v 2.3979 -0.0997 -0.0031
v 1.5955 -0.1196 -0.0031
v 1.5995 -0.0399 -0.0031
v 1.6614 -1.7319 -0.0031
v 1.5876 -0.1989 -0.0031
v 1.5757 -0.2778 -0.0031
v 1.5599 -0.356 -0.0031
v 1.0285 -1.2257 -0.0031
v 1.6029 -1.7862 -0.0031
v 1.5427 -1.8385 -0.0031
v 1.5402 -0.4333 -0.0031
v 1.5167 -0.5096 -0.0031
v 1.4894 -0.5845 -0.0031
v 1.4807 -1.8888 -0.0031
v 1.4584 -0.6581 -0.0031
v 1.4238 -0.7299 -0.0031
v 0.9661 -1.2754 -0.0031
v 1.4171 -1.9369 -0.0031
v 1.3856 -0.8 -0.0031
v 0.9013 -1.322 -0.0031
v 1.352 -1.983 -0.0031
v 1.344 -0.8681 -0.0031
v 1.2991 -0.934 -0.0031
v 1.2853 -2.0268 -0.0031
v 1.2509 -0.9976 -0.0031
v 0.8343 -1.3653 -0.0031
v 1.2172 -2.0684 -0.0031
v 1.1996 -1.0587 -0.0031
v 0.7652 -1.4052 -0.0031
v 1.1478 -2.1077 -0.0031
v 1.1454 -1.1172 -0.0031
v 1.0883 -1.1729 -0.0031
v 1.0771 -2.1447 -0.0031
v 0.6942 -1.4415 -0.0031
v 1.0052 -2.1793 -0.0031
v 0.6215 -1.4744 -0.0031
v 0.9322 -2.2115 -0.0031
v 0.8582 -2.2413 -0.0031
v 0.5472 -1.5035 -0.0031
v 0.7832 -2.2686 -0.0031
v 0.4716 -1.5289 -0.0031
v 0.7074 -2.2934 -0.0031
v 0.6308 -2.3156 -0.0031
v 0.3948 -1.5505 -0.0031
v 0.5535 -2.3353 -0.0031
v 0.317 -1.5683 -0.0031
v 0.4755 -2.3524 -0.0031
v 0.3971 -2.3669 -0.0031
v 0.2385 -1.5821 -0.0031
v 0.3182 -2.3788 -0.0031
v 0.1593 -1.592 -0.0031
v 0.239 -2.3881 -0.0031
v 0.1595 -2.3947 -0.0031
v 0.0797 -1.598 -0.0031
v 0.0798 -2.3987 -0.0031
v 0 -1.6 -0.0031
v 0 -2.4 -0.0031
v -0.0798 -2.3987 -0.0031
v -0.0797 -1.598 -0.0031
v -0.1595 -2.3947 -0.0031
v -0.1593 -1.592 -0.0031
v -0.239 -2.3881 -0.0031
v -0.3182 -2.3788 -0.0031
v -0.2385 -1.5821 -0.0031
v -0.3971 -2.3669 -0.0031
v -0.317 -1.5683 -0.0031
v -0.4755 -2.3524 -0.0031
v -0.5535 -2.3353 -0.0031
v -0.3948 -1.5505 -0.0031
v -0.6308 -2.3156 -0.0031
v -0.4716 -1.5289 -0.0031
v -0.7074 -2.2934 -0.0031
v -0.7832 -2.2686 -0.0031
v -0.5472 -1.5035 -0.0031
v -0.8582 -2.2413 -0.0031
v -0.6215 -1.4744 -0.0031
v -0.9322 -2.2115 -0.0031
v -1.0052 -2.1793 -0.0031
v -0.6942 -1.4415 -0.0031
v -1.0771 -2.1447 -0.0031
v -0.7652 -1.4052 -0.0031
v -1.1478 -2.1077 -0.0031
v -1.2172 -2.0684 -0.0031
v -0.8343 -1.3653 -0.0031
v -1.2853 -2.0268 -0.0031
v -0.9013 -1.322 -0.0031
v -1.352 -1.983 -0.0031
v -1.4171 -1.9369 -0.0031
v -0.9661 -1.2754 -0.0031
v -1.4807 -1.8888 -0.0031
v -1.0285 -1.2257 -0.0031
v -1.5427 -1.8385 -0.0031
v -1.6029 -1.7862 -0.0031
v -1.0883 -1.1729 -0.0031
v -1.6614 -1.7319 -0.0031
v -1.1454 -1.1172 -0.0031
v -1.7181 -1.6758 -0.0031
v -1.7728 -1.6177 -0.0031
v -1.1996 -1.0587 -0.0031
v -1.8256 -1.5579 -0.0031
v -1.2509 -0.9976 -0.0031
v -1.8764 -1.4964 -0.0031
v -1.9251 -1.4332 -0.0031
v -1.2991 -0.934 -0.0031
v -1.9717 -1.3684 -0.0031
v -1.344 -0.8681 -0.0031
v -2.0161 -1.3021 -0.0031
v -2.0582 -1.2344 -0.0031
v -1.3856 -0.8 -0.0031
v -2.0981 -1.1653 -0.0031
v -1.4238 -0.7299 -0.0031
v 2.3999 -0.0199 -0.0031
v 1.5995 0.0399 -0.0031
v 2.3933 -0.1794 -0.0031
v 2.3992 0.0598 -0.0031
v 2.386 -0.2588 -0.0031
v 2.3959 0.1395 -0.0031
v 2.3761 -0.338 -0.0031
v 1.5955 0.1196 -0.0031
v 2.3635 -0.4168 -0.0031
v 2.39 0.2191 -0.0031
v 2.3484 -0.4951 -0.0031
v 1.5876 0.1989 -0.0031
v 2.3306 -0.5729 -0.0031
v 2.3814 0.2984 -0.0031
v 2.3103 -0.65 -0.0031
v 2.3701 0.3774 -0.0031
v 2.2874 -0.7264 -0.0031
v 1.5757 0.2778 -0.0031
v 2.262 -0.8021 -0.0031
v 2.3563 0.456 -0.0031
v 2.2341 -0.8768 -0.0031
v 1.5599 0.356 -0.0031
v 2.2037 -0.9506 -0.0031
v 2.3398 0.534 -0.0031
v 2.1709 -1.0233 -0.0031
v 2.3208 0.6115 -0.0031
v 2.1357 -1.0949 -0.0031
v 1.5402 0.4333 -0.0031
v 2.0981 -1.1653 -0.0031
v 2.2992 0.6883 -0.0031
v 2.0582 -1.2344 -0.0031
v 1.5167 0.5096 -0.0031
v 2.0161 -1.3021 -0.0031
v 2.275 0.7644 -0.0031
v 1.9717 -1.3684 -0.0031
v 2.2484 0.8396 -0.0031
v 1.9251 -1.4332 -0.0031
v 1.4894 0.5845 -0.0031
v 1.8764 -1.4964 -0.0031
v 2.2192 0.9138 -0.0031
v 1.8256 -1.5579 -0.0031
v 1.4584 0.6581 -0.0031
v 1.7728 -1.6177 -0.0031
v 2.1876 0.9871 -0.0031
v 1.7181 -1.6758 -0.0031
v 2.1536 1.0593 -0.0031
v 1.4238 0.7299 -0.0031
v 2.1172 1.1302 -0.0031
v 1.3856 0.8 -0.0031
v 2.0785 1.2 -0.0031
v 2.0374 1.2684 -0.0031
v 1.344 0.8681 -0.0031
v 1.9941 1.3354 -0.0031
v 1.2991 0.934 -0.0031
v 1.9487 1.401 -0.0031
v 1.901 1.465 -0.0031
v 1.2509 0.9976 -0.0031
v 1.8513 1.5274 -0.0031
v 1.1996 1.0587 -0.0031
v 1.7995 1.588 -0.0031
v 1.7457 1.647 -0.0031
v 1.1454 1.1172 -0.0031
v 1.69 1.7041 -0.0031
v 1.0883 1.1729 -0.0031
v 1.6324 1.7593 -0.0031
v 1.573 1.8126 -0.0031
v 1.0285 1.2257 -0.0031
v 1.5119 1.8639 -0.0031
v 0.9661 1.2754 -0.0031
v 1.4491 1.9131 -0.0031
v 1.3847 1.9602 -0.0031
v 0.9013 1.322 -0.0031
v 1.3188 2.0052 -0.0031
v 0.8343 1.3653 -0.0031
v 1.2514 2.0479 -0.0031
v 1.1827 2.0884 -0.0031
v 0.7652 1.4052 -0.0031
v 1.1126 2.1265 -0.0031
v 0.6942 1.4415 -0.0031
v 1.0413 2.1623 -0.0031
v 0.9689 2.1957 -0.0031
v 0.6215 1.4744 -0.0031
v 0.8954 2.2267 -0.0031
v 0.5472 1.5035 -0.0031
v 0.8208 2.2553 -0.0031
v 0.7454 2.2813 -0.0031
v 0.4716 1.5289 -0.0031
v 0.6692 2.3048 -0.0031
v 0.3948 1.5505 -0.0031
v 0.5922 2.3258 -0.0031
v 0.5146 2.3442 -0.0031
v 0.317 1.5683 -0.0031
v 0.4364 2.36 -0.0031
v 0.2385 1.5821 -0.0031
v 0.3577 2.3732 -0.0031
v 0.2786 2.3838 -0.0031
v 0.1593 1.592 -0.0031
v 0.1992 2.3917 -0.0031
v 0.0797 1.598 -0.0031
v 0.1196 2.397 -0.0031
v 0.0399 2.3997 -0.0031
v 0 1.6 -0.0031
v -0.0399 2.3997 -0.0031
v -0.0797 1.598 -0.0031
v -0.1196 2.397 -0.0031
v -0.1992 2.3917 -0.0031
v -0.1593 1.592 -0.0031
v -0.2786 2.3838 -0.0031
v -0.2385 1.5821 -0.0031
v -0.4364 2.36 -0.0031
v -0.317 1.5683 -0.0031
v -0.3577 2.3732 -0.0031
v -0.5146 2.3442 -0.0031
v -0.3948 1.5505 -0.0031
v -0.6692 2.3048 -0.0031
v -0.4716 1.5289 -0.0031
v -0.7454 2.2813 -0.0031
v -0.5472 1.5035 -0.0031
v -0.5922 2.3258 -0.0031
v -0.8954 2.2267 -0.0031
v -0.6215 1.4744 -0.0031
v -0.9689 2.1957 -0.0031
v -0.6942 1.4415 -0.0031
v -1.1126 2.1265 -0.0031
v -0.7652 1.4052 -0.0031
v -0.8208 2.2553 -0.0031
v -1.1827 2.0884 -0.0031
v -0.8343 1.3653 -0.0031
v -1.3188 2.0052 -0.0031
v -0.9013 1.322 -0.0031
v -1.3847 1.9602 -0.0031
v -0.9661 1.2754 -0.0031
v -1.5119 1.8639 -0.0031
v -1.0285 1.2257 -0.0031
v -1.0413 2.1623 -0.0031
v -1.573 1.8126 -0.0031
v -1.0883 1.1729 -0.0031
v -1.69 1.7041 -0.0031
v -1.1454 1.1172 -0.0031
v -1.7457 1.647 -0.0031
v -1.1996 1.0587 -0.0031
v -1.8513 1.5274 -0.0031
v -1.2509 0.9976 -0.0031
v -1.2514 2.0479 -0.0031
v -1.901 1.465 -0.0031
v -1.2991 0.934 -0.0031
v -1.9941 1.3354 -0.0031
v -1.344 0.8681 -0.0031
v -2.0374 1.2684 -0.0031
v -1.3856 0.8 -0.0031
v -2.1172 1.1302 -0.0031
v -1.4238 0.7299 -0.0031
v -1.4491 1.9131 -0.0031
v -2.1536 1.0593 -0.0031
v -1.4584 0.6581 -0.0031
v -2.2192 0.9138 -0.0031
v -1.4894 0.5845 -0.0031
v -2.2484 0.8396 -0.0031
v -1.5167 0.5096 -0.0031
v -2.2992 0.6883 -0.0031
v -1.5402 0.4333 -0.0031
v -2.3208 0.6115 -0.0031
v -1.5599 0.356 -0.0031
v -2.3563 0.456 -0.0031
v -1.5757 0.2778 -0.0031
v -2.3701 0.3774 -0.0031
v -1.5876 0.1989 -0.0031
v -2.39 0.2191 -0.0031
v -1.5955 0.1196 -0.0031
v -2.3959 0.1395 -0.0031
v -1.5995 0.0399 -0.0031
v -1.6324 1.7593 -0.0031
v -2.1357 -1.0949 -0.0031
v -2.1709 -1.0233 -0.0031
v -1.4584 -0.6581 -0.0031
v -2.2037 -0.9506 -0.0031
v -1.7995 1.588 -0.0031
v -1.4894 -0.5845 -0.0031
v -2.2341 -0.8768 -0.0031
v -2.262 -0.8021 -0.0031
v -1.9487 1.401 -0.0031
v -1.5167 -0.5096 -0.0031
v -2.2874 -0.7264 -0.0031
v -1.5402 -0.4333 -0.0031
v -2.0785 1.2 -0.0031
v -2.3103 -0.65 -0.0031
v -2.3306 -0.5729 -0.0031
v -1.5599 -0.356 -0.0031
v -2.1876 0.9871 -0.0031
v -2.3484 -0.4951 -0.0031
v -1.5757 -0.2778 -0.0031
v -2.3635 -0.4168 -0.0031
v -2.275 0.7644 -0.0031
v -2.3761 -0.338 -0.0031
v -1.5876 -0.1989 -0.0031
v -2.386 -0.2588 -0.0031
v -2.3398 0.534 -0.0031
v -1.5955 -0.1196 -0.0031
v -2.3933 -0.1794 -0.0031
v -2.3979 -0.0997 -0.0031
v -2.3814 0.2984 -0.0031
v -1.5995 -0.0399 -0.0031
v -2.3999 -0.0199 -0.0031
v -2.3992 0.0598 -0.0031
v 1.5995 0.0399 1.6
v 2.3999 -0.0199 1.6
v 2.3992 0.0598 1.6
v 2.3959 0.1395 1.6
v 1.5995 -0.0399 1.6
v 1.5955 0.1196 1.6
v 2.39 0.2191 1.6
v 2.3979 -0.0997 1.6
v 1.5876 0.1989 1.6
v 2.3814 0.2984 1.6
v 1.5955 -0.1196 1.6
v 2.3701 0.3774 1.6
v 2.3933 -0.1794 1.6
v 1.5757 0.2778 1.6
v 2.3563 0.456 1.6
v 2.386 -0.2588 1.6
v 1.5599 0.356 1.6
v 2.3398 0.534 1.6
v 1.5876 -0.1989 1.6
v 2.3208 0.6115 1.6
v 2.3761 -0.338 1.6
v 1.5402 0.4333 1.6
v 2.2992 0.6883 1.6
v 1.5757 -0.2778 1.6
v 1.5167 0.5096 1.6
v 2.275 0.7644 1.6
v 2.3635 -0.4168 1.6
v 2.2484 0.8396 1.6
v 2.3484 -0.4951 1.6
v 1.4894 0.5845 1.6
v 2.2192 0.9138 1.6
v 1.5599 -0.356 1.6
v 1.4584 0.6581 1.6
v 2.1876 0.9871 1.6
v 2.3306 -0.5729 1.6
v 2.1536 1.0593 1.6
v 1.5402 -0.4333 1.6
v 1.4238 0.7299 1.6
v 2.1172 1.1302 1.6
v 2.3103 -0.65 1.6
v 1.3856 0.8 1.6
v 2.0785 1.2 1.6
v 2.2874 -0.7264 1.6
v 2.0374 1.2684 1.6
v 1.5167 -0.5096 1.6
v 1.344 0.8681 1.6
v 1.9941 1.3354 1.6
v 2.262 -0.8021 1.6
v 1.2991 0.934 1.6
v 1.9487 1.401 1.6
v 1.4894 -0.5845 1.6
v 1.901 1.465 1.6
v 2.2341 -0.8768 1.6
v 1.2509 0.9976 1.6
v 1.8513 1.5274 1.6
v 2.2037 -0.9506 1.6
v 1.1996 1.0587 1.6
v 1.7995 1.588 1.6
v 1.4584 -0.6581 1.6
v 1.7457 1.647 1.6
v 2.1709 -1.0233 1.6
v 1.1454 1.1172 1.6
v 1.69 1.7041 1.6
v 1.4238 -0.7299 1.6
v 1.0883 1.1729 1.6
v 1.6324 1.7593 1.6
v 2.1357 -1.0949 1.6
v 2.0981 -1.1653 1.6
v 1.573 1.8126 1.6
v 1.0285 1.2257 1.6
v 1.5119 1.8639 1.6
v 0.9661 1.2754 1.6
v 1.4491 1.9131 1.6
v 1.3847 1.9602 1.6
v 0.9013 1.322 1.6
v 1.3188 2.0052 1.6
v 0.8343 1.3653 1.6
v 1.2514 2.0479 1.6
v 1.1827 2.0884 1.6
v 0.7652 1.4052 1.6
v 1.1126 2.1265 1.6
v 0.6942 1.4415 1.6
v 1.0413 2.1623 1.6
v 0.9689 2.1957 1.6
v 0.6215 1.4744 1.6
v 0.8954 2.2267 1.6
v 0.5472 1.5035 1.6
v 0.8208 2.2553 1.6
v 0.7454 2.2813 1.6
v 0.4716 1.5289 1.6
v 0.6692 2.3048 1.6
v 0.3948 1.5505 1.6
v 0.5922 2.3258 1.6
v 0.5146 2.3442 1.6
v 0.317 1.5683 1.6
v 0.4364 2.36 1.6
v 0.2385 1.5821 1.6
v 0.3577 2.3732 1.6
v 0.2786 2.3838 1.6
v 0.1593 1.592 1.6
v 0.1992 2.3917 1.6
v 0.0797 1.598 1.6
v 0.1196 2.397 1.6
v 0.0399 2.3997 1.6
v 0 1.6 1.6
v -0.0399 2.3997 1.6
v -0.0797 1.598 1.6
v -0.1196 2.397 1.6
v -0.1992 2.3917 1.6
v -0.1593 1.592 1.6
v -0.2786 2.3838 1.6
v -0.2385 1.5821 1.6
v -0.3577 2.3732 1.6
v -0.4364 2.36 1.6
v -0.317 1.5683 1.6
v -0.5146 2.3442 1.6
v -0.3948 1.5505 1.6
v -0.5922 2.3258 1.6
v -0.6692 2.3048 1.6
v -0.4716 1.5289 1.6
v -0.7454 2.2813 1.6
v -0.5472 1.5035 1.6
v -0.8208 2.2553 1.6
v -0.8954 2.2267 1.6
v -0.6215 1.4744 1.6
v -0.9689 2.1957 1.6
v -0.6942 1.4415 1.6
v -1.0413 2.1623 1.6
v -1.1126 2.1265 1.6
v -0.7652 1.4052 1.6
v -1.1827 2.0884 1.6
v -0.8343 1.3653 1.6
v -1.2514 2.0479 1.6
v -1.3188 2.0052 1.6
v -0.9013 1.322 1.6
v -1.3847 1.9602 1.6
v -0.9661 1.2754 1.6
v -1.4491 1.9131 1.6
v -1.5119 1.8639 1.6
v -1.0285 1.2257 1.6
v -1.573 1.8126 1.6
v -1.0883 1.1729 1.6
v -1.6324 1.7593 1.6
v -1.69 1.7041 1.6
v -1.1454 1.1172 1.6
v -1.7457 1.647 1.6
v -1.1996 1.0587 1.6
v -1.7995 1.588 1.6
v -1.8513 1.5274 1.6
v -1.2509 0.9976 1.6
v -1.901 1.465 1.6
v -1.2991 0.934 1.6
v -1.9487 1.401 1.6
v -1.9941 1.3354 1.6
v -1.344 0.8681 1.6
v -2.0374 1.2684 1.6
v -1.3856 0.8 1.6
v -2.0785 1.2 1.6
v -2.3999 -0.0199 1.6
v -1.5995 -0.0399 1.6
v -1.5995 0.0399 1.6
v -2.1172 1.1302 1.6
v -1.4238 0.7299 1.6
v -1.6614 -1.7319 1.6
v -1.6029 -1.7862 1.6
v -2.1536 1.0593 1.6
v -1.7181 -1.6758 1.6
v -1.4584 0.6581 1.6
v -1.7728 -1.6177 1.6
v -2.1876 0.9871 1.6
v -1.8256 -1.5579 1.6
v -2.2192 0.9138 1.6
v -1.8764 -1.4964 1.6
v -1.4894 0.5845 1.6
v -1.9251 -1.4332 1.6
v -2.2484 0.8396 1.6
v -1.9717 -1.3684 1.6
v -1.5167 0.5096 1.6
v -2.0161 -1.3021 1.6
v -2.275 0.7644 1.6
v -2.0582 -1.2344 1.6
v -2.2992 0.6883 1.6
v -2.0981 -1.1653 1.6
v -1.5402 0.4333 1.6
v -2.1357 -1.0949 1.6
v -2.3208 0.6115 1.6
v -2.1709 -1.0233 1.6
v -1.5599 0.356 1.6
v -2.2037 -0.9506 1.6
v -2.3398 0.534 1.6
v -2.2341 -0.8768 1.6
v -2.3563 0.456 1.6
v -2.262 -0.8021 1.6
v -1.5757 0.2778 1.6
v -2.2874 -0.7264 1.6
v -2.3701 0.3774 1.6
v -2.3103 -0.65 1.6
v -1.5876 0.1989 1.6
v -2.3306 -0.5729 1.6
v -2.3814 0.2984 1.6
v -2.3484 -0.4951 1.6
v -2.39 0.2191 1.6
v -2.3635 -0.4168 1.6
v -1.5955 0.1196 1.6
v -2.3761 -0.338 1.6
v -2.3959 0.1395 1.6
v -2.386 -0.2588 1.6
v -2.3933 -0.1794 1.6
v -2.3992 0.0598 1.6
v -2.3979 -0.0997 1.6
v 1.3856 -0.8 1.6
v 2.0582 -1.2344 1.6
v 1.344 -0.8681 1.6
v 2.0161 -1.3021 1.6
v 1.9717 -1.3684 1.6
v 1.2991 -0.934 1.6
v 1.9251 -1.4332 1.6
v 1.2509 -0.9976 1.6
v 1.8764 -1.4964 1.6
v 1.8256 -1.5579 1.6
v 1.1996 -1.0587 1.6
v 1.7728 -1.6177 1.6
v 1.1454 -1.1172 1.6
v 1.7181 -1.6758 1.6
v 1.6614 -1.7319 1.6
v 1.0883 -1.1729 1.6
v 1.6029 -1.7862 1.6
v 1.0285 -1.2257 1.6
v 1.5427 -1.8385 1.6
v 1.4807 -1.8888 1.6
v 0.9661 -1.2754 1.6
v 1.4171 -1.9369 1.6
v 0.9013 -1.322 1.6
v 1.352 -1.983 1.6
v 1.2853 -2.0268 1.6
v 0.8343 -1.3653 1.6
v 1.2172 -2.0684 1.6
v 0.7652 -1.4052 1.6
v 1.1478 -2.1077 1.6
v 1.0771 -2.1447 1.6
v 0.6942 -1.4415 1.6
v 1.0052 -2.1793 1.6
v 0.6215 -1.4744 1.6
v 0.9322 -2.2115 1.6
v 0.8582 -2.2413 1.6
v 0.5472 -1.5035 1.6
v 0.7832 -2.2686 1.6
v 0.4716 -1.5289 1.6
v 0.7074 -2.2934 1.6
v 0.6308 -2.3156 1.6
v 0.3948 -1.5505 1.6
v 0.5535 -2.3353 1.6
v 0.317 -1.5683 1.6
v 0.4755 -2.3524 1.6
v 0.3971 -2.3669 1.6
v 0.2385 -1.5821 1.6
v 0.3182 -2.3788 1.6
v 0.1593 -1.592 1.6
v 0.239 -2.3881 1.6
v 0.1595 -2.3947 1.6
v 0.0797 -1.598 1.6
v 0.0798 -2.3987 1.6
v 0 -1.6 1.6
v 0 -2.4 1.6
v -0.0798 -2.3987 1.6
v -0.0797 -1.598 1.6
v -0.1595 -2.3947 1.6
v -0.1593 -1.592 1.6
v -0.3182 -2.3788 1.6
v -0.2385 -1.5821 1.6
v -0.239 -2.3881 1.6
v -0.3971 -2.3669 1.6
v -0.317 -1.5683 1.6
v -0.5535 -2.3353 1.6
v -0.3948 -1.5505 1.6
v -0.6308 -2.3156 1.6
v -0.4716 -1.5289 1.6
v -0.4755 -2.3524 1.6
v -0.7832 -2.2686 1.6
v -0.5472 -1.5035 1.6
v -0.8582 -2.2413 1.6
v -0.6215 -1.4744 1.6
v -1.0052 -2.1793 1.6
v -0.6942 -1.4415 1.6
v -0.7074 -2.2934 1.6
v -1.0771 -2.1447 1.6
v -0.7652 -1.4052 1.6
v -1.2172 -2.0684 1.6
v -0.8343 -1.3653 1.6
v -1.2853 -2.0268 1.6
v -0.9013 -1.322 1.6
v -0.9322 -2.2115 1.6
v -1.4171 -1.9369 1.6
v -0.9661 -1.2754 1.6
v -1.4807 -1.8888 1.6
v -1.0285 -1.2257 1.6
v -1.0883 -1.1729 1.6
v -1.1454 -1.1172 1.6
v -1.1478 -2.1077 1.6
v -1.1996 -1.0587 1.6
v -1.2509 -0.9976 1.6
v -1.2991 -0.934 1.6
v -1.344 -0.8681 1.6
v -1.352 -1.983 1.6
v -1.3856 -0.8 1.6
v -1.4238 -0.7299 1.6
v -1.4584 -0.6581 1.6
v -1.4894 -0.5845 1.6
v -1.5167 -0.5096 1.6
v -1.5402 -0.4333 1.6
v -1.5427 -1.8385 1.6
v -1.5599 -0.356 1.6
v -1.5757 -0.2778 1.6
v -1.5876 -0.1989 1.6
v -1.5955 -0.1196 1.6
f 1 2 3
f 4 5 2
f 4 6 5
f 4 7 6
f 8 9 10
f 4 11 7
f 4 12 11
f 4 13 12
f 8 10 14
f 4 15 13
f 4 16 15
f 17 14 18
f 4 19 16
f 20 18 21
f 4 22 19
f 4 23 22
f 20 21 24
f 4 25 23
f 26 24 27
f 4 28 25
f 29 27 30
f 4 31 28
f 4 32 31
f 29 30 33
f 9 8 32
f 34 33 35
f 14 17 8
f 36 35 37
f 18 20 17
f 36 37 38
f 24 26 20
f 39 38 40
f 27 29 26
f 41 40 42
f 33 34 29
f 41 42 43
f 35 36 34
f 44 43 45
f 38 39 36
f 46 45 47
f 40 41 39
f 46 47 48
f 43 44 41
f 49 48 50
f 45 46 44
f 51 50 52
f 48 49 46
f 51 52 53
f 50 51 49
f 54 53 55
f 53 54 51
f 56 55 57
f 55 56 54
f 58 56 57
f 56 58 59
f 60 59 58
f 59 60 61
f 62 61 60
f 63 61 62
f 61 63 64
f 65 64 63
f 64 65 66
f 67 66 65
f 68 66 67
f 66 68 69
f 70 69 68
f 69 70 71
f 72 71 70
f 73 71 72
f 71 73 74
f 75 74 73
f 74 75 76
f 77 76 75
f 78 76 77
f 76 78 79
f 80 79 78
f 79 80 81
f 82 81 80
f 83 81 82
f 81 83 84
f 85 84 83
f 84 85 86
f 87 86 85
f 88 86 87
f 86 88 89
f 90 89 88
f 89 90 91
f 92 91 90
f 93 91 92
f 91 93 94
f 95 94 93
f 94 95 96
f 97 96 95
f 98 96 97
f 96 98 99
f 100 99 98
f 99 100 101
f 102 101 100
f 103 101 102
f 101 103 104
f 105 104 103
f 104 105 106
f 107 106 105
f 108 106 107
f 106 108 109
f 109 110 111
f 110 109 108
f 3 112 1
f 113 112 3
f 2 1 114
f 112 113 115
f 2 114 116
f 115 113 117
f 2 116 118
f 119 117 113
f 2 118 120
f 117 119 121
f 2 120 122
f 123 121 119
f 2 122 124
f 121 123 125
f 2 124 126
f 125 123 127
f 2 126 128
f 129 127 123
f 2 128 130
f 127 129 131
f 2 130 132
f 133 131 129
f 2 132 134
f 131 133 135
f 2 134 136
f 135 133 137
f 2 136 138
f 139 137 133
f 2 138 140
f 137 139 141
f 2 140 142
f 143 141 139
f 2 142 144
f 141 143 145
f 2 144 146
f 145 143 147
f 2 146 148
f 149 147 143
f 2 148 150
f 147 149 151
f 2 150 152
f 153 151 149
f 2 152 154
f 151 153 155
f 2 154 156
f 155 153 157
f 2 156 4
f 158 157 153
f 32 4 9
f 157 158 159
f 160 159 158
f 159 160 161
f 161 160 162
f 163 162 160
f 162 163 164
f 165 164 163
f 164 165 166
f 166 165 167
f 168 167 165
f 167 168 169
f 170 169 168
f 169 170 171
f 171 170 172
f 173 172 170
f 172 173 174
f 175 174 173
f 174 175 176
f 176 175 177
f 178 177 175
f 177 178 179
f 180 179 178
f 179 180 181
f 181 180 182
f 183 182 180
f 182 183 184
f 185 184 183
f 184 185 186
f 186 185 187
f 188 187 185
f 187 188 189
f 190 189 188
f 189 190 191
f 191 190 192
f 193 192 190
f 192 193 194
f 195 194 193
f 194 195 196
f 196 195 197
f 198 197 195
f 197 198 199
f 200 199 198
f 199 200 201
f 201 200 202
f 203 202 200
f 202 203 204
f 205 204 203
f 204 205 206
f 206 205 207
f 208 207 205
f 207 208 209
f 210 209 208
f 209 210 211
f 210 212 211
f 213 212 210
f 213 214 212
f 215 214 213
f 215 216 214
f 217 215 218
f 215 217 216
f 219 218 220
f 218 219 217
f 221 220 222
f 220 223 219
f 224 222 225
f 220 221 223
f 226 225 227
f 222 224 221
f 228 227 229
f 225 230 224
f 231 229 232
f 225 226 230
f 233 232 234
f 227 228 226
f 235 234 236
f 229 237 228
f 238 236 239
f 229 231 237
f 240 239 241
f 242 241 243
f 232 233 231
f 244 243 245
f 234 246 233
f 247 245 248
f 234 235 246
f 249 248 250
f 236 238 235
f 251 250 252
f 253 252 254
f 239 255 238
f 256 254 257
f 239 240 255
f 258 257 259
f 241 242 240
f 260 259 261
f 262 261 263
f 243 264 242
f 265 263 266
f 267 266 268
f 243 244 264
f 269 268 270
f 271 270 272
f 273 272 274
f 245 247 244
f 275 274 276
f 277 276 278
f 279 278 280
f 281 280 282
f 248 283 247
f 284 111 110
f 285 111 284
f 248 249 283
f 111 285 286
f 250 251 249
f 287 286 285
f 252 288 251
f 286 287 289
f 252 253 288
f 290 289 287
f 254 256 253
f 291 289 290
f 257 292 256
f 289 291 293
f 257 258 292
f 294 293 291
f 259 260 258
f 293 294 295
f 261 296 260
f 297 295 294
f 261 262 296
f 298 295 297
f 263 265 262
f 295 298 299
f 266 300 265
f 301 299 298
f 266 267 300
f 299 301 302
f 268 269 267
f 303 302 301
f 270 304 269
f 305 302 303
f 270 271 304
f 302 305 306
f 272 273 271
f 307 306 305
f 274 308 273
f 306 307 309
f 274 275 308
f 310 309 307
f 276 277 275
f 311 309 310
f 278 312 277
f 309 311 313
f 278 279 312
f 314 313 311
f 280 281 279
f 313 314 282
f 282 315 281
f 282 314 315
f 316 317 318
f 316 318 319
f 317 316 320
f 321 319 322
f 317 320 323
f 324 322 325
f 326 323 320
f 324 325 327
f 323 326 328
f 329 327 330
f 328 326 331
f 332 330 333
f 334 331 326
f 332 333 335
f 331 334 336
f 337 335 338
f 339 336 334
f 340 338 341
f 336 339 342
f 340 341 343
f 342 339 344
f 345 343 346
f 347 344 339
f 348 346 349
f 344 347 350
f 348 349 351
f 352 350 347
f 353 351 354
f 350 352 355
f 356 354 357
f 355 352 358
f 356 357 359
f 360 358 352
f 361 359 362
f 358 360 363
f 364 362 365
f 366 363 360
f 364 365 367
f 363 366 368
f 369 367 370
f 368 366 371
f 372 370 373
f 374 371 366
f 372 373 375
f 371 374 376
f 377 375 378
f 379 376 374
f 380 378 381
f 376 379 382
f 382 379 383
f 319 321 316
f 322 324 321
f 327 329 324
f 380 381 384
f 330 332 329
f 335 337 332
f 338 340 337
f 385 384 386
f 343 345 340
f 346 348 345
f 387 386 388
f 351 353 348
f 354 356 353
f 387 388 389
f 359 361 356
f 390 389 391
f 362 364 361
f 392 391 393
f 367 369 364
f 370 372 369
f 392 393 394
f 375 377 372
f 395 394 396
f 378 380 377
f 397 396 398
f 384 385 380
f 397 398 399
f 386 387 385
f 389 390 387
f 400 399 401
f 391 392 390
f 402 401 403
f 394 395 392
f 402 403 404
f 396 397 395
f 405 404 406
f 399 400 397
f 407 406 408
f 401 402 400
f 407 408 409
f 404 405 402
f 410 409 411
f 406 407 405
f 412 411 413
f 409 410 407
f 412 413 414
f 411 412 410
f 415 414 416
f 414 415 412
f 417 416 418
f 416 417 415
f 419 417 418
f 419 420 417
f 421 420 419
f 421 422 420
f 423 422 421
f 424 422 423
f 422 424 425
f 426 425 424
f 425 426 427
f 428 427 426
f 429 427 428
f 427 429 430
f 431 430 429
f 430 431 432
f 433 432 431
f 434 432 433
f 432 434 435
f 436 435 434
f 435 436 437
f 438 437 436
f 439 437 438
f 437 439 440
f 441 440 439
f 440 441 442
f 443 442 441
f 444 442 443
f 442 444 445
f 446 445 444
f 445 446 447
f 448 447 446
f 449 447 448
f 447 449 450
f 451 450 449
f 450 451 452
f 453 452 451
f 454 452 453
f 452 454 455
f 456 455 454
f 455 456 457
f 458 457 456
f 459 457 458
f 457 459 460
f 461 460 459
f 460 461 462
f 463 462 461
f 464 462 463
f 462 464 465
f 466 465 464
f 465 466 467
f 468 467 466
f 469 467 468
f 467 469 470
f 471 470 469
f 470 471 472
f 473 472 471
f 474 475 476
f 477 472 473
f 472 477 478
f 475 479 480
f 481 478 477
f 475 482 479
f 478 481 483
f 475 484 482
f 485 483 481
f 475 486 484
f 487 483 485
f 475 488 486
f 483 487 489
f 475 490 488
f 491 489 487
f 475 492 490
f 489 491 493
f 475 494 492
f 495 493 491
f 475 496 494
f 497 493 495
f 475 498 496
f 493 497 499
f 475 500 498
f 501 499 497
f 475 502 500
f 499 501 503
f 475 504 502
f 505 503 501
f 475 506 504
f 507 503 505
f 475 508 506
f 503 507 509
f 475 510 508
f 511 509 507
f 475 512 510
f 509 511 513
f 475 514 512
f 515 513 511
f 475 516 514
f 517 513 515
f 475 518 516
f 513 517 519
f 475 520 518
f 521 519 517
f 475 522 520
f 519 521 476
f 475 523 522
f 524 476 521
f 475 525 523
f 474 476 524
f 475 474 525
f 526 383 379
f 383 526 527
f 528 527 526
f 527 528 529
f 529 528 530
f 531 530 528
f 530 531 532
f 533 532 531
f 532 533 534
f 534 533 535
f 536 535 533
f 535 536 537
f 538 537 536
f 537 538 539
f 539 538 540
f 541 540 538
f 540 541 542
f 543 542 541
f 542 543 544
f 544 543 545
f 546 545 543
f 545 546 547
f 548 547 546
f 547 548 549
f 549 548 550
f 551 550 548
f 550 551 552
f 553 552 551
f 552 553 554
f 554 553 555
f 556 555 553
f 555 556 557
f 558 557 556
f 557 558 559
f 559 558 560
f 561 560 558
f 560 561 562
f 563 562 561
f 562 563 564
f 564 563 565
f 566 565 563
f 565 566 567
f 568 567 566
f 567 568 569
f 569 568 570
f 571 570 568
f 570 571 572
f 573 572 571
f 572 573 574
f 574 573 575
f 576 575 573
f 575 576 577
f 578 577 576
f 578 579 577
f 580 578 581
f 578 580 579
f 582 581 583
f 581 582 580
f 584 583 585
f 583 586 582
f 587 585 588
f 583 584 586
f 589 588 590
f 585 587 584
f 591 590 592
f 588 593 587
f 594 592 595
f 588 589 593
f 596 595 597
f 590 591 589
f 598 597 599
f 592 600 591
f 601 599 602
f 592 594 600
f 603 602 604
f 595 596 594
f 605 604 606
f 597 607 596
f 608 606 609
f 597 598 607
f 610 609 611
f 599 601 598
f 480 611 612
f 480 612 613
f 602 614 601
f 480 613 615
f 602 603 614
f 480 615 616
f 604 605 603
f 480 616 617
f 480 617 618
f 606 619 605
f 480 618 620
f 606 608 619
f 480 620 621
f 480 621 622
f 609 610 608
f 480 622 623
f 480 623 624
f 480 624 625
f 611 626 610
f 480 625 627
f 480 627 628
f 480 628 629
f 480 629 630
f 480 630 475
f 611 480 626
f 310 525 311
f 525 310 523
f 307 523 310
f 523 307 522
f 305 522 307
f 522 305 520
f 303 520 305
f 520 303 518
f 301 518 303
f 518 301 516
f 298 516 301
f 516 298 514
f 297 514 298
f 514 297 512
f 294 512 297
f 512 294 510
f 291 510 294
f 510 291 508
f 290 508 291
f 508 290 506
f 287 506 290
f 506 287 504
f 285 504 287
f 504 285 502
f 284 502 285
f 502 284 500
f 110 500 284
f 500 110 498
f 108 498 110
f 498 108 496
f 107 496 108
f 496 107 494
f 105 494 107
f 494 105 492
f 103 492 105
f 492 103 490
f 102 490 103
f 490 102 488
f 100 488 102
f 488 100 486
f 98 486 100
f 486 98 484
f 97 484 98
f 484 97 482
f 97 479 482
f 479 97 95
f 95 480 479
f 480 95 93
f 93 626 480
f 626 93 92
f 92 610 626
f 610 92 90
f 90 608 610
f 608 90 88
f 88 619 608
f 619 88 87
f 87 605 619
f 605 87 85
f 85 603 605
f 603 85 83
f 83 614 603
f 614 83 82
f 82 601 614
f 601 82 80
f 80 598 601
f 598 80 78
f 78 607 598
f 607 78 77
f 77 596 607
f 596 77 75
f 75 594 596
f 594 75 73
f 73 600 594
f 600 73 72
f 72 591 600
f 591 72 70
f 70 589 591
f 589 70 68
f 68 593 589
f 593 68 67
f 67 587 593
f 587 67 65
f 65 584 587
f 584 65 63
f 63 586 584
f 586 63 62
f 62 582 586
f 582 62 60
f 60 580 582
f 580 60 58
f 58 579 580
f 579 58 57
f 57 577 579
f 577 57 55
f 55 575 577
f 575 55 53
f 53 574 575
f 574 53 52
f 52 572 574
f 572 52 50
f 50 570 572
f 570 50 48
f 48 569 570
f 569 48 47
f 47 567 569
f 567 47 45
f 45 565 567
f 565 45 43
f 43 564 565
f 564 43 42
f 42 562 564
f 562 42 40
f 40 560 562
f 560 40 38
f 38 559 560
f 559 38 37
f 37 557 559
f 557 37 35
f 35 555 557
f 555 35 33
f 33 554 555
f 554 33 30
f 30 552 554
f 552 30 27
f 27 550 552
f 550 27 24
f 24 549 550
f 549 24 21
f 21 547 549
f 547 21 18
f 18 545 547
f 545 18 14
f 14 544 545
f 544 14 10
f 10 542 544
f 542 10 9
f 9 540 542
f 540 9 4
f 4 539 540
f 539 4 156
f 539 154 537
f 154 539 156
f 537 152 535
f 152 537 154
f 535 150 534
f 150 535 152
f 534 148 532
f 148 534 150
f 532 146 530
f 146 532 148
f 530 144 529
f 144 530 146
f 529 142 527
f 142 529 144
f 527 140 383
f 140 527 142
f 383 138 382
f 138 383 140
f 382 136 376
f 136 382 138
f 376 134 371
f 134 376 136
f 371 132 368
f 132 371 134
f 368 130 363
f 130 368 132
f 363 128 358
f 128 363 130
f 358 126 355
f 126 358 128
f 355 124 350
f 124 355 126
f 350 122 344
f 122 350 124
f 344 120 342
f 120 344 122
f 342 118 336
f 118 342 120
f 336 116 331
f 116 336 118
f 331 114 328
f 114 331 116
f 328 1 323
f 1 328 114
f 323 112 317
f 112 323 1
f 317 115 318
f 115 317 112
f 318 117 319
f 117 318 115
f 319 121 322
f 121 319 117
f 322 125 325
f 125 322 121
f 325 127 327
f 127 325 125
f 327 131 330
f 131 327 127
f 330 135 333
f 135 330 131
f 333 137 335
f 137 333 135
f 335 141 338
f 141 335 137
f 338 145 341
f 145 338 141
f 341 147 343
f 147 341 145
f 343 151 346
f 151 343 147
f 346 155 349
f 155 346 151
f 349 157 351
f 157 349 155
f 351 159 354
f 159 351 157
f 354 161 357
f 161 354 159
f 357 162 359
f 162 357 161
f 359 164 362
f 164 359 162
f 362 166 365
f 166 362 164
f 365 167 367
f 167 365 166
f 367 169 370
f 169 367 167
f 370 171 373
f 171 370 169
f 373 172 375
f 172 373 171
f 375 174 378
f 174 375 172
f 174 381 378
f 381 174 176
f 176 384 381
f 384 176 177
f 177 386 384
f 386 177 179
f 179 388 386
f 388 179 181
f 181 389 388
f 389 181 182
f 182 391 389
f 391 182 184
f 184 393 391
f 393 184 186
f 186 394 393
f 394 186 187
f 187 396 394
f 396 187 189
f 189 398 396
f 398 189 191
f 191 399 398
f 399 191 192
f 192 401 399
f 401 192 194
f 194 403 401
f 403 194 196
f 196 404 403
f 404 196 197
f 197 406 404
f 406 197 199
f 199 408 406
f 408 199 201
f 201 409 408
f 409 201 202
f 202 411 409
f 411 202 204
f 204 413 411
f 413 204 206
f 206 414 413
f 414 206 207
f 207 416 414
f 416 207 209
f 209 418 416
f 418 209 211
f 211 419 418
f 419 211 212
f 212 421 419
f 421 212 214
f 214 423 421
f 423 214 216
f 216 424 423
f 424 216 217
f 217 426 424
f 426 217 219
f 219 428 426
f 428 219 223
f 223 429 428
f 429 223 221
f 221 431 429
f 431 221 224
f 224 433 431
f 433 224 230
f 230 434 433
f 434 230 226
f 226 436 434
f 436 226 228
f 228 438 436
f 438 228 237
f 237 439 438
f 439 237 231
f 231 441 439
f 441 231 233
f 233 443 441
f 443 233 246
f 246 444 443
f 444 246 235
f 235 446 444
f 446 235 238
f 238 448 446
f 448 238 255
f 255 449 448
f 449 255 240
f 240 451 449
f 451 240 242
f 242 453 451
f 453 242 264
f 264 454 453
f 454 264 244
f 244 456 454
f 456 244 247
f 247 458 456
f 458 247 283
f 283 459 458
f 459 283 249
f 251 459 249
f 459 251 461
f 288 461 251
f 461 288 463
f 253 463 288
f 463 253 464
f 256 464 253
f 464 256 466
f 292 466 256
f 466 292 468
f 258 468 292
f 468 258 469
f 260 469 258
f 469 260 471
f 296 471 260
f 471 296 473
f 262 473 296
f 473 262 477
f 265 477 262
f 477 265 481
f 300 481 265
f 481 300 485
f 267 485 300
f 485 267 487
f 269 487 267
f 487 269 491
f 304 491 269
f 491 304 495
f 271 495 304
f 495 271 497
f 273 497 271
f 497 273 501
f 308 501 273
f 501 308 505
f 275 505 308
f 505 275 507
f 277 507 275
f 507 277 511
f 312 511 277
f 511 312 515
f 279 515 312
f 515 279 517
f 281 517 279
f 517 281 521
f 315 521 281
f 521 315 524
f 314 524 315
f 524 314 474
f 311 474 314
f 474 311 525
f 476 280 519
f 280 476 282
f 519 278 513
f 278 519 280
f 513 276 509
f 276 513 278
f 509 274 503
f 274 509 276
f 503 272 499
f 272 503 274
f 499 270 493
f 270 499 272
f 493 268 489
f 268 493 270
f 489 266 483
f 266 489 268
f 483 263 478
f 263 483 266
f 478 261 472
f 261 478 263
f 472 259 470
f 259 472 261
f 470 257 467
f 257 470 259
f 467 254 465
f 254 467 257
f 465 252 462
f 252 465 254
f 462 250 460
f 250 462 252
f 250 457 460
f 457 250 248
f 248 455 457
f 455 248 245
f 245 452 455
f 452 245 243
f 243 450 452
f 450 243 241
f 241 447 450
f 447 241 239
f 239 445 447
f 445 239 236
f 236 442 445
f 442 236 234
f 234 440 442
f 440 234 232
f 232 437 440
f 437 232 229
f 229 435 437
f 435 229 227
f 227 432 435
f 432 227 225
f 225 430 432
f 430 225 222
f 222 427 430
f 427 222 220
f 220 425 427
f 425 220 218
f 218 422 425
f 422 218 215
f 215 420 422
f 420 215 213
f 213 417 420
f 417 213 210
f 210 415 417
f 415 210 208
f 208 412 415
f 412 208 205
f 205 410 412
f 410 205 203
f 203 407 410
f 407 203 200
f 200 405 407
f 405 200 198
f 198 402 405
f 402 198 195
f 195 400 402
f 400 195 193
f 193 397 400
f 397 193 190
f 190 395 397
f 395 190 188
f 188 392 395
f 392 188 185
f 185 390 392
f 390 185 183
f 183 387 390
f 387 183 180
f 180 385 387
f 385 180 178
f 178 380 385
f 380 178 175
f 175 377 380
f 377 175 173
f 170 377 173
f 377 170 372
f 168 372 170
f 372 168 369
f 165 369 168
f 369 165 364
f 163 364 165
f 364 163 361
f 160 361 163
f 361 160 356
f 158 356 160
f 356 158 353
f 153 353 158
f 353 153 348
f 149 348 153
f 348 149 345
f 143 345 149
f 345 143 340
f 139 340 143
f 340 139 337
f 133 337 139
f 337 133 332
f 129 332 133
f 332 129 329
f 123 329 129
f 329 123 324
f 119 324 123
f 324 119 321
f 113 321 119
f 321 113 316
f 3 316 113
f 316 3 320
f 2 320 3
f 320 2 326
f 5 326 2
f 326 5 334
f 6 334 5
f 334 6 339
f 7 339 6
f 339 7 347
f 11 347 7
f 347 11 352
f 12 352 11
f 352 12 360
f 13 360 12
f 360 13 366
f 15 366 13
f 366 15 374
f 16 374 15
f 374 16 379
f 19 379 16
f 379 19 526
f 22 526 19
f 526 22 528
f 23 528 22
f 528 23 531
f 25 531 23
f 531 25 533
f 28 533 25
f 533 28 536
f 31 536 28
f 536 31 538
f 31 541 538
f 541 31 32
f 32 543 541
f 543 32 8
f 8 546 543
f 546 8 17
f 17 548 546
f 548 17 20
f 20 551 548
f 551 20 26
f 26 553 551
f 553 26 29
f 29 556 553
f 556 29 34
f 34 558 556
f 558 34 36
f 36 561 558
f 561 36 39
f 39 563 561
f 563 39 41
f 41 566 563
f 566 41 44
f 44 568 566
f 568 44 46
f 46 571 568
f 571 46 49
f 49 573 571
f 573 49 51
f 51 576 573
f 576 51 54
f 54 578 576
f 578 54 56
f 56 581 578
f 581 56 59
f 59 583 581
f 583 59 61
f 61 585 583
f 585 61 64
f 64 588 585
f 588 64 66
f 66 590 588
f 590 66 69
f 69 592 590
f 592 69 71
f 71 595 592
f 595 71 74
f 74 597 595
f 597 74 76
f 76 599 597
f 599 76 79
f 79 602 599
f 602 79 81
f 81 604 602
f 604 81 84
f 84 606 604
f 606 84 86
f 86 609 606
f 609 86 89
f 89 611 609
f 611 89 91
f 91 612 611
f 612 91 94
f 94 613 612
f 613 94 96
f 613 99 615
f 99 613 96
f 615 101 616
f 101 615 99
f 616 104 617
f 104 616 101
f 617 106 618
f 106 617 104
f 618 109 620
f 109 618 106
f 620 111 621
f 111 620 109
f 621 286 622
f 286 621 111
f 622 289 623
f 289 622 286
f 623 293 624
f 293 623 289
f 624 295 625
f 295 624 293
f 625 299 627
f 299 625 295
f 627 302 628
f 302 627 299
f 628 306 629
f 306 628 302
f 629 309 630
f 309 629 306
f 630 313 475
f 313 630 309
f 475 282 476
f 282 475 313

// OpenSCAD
use <../lib.scad>
use <s/4181s01.scad>
use <s/4181s02.scad>
use <../p/stud2.scad>
$fa=1; $fs=0.2;
function ldraw_lib__4181p06(realsolid=false) = [
// 0 Train Door  1 x  4 x  5 Left with Red/Blue Stripe Pattern
// 0 Name: 4181p06.dat
// 0 Author: William Howard [WilliamH]
// 0 !LDRAW_ORG Part UPDATE 2009-01
// 0 !LICENSE Licensed under CC BY 2.0 and CC BY 4.0 : see CAreadme.txt
// 
// 0 BFC CERTIFY CCW
  [0,"BFC","CERTIFY"],
  [0,"BFC","CCW"],
// 
// 0 !HISTORY 2009-05-02 [PTadmin] Official Update 2009-01
// 
// 
// 1 16 0 0 0 1 0 0 0 1 0 0 0 1 stud2.dat
  [1,16,0,0,0,1,0,0,0,1,0,0,0,1, ldraw_lib__stud2(realsolid)],
// 1 16 0 0 0 1 0 0 0 1 0 0 0 1 s\4181s01.dat
  [1,16,0,0,0,1,0,0,0,1,0,0,0,1, ldraw_lib__s__4181s01(realsolid)],
// 1 16 0 72 0 1 0 0 0 1 0 0 0 1 s\4181s02.dat
  [1,16,0,72,0,1,0,0,0,1,0,0,0,1, ldraw_lib__s__4181s02(realsolid)],
// 1 4 0 80 0 1 0 0 0 1 0 0 0 1 s\4181s02.dat
  [1,4,0,80,0,1,0,0,0,1,0,0,0,1, ldraw_lib__s__4181s02(realsolid)],
// 1 16 0 88 0 1 0 0 0 1 0 0 0 1 s\4181s02.dat
  [1,16,0,88,0,1,0,0,0,1,0,0,0,1, ldraw_lib__s__4181s02(realsolid)],
// 1 1 0 96 0 1 0 0 0 3 0 0 0 1 s\4181s02.dat
  [1,1,0,96,0,1,0,0,0,3,0,0,0,1, ldraw_lib__s__4181s02(realsolid)],
// 0
];
module ldraw_lib__4181p06(step=0, col=false, unit=2/5, alt=false, line=0.2, solid=!$preview)
    makepoly(ldraw_lib__4181p06(solid), step=step, col=col, unit=unit, alt=alt, line=line, solid=solid);
ldraw_lib__4181p06(line=0.2);
